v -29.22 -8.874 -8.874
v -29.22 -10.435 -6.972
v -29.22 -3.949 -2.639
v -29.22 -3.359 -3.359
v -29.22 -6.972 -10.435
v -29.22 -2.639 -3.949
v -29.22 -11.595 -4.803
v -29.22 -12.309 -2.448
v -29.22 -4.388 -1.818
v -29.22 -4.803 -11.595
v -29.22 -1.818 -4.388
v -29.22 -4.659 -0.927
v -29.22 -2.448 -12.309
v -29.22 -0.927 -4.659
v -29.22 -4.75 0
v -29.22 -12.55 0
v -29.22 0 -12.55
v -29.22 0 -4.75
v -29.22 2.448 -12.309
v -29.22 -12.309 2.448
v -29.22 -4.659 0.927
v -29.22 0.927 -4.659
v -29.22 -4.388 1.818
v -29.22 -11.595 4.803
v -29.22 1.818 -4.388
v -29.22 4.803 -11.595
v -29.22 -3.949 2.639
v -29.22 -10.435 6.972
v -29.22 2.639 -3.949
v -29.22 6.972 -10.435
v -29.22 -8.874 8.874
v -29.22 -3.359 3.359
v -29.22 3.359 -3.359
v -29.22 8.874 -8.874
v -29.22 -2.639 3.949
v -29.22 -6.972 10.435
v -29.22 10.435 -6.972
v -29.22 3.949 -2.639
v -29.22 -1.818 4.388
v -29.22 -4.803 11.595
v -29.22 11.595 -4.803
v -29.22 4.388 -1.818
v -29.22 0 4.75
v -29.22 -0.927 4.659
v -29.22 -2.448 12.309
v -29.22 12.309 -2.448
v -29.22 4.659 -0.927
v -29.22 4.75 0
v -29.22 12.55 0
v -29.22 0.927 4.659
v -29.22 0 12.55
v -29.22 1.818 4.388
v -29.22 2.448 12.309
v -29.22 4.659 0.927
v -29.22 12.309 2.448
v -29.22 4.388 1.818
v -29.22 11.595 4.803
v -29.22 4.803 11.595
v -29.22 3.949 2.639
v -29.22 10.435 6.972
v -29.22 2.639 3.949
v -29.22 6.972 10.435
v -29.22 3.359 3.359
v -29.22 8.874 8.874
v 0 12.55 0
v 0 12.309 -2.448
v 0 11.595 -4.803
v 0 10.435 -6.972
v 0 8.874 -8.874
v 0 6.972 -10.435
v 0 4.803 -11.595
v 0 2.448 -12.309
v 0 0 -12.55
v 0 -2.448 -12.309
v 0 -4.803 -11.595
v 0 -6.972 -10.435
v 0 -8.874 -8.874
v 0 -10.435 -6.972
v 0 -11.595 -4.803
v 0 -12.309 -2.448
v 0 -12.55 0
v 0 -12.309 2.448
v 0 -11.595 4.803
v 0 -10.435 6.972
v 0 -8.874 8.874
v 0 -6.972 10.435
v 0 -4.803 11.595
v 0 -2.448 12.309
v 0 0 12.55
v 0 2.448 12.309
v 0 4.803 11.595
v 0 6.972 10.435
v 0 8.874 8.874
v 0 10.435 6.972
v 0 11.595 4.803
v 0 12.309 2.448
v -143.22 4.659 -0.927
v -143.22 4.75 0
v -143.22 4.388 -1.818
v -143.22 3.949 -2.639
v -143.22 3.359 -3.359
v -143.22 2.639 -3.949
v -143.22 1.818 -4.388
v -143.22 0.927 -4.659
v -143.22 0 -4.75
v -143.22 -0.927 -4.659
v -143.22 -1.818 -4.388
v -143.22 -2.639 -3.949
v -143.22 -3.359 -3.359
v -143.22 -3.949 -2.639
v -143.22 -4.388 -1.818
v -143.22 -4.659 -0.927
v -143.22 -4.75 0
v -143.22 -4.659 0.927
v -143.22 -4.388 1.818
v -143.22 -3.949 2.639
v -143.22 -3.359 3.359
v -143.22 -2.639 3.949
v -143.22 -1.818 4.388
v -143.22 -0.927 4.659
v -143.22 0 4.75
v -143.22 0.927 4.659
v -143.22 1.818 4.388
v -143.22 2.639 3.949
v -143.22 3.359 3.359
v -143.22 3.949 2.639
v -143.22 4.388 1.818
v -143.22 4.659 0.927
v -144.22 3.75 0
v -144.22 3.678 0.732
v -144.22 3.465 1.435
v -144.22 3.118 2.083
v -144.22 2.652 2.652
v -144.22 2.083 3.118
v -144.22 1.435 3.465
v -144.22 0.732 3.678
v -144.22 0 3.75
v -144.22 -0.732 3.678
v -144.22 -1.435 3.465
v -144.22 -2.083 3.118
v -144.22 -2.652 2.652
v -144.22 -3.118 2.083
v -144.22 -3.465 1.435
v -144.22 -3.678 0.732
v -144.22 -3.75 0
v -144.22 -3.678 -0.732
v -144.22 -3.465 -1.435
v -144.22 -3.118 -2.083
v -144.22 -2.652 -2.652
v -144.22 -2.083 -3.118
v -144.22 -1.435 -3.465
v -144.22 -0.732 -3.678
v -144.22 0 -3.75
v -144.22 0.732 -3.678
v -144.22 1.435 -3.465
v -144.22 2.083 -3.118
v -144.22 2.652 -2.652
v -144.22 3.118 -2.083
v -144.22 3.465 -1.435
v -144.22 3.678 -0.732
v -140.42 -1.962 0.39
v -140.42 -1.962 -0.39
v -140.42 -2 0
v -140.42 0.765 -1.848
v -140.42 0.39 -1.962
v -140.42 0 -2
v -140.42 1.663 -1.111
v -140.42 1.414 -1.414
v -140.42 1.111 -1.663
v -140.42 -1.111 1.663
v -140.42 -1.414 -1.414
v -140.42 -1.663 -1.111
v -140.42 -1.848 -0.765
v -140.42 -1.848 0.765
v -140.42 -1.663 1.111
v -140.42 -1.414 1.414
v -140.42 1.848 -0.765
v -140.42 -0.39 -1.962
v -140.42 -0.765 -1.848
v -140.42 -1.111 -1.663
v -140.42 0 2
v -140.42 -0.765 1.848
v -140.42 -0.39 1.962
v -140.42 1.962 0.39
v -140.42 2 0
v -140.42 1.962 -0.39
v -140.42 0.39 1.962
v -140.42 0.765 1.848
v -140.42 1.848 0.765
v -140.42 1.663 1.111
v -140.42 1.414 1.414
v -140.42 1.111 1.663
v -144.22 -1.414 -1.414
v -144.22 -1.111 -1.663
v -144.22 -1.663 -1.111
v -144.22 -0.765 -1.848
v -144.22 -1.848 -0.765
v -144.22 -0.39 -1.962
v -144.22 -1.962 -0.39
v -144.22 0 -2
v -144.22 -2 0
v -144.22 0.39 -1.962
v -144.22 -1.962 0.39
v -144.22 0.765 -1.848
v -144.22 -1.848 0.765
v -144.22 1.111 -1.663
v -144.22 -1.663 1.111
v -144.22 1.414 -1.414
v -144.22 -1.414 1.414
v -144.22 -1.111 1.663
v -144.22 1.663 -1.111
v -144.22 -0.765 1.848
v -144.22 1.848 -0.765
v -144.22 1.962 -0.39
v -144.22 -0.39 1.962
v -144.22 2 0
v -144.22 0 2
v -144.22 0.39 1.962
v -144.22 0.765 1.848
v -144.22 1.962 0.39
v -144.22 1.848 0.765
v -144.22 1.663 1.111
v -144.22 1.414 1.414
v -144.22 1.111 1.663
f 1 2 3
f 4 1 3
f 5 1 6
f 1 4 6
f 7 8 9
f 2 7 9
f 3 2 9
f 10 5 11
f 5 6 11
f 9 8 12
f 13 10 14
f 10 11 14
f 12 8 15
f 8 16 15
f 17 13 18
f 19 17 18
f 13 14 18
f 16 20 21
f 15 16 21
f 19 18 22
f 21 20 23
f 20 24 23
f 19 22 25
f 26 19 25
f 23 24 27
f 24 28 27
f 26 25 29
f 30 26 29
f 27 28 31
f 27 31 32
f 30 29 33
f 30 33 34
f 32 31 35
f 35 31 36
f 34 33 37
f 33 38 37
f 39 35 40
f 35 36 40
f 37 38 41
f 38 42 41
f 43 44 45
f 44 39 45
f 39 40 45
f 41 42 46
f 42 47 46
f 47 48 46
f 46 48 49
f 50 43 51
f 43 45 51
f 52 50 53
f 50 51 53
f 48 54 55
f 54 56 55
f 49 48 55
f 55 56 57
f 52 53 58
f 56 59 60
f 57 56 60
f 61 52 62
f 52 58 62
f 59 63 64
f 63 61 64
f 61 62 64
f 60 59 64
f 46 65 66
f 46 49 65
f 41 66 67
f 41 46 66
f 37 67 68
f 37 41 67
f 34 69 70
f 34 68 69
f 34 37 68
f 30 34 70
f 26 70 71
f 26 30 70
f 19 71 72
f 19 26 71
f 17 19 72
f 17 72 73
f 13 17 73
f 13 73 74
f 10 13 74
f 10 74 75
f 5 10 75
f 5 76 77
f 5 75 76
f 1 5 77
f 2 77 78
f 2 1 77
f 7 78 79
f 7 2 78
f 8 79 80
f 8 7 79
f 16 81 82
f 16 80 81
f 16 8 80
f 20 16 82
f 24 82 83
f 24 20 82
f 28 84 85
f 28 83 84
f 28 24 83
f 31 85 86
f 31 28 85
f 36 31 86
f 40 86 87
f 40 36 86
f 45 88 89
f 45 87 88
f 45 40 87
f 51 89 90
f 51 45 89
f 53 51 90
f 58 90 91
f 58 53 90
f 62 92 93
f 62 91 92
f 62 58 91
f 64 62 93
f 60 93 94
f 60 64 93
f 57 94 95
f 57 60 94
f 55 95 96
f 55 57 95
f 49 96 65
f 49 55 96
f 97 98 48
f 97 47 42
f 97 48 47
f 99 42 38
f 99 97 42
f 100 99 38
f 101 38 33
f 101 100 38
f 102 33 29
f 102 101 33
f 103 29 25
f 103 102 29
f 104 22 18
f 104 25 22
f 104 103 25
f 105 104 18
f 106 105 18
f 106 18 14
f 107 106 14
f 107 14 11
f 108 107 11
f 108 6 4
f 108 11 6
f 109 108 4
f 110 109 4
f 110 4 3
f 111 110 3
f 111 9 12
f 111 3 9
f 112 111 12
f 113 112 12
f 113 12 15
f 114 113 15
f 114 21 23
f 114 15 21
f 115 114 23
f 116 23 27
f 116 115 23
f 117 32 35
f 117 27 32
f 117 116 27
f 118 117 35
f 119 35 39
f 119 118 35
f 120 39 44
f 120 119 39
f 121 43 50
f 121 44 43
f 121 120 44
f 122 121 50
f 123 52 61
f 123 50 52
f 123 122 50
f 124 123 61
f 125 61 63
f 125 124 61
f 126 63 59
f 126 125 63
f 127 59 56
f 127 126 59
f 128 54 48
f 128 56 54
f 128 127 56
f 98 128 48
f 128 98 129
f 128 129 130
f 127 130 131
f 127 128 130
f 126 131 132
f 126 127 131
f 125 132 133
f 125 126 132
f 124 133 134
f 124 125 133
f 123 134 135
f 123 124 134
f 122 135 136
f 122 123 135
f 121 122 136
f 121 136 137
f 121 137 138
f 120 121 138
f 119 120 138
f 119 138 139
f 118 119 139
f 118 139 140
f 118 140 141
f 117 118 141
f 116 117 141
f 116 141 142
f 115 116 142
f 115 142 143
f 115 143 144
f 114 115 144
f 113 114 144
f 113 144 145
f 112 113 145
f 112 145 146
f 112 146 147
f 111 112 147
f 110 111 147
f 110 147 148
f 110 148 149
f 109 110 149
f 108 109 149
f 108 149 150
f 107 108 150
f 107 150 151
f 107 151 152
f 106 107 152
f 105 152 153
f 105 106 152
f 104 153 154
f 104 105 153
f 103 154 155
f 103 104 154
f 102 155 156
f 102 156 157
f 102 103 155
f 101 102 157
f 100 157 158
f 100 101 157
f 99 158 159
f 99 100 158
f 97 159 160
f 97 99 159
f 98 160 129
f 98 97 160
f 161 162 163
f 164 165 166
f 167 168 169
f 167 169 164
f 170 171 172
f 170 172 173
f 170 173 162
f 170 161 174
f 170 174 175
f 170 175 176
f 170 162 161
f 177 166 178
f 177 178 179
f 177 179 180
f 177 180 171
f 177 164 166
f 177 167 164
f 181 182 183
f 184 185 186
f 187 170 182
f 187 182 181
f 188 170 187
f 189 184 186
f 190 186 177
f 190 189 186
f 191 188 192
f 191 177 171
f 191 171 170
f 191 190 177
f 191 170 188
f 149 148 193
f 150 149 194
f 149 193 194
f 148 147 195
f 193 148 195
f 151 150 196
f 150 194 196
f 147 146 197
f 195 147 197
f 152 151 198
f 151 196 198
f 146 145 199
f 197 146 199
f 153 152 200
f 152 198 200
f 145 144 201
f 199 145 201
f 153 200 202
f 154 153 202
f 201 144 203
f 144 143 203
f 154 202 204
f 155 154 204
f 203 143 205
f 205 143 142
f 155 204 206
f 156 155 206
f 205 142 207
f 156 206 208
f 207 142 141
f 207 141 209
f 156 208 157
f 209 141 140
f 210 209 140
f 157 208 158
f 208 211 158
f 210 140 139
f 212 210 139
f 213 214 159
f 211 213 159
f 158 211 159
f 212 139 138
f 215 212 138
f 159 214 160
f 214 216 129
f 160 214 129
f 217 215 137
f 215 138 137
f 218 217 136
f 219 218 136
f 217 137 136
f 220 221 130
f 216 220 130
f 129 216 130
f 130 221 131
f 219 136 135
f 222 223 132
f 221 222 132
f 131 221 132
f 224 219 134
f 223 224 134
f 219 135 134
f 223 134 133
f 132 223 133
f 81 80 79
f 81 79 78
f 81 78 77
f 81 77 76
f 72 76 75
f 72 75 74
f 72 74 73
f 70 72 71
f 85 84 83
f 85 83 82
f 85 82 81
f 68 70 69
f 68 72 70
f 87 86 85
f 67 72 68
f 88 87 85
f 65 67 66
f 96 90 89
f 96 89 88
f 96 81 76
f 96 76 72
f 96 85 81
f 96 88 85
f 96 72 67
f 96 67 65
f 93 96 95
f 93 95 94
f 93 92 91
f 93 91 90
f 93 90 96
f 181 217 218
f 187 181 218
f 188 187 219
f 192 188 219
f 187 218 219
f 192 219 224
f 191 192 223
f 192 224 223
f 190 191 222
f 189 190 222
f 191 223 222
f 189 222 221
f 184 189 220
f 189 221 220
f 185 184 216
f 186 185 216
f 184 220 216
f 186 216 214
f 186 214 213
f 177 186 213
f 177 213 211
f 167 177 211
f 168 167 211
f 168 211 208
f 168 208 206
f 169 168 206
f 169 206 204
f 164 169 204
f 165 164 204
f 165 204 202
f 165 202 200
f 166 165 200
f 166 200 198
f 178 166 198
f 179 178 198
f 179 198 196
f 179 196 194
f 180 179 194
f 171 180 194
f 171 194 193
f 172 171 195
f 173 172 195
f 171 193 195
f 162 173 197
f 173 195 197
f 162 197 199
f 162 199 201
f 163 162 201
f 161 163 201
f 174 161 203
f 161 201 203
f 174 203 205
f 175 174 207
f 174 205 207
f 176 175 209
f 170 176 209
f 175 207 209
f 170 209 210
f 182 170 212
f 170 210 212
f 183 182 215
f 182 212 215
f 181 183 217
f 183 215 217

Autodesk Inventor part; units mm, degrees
ref_plane "YZ Plane" through (0, 0, 0) normal (1, 0, 0) x (0, 1, 0)
ref_plane "XZ Plane" through (0, 0, 0) normal (0, 1, 0) x (-1, 0, 0)
ref_plane "XY Plane" through (0, 0, 0) normal (0, 0, 1) x (1, 0, 0)
sketch "草圖1" plane through (0, 0, 0) normal (0, 0, 1) x (1, 0, 0)
  line L0 (0, 0) -> (0, 12.55)
  line L1 (0, 12.55) -> (-29.22, 12.55)
  line L2 (-29.22, 12.55) -> (-29.22, 4.75)
  line L3 (-29.22, 4.75) -> (-144.22, 4.75)
  line L4 (-144.22, 4.75) -> (-144.22, 0)
  line L5 (-144.22, 0) -> (0, 0)
  dimension "d0" = 29.22
  dimension "d1" = 12.55
  dimension "d2" = 115
  dimension "d3" = 4.75
revolve "迴轉1" add sketch "草圖1" angle 360 about axis through (-144.22, 0, 0) along (1, 0, 0)
chamfer "倒角1" distance 1 angle 45 1 edges at (-144.22, -4.75, 0)
thread "螺紋1" size "M10x1.5" class "6g" standard "ANSI Metric M Profile" length 105.9
sketch "草圖2" plane through (-144.22, 0, 0) normal (-1, 0, 0) x (0, 0, 1)
  circle A0 centre (0, 0) radius 2
  dimension "d10" = 4
extrude "擠出1" cut sketch "草圖2" against normal blind 3.8
properties part number "螺桿" material "鋁合金 6061"
